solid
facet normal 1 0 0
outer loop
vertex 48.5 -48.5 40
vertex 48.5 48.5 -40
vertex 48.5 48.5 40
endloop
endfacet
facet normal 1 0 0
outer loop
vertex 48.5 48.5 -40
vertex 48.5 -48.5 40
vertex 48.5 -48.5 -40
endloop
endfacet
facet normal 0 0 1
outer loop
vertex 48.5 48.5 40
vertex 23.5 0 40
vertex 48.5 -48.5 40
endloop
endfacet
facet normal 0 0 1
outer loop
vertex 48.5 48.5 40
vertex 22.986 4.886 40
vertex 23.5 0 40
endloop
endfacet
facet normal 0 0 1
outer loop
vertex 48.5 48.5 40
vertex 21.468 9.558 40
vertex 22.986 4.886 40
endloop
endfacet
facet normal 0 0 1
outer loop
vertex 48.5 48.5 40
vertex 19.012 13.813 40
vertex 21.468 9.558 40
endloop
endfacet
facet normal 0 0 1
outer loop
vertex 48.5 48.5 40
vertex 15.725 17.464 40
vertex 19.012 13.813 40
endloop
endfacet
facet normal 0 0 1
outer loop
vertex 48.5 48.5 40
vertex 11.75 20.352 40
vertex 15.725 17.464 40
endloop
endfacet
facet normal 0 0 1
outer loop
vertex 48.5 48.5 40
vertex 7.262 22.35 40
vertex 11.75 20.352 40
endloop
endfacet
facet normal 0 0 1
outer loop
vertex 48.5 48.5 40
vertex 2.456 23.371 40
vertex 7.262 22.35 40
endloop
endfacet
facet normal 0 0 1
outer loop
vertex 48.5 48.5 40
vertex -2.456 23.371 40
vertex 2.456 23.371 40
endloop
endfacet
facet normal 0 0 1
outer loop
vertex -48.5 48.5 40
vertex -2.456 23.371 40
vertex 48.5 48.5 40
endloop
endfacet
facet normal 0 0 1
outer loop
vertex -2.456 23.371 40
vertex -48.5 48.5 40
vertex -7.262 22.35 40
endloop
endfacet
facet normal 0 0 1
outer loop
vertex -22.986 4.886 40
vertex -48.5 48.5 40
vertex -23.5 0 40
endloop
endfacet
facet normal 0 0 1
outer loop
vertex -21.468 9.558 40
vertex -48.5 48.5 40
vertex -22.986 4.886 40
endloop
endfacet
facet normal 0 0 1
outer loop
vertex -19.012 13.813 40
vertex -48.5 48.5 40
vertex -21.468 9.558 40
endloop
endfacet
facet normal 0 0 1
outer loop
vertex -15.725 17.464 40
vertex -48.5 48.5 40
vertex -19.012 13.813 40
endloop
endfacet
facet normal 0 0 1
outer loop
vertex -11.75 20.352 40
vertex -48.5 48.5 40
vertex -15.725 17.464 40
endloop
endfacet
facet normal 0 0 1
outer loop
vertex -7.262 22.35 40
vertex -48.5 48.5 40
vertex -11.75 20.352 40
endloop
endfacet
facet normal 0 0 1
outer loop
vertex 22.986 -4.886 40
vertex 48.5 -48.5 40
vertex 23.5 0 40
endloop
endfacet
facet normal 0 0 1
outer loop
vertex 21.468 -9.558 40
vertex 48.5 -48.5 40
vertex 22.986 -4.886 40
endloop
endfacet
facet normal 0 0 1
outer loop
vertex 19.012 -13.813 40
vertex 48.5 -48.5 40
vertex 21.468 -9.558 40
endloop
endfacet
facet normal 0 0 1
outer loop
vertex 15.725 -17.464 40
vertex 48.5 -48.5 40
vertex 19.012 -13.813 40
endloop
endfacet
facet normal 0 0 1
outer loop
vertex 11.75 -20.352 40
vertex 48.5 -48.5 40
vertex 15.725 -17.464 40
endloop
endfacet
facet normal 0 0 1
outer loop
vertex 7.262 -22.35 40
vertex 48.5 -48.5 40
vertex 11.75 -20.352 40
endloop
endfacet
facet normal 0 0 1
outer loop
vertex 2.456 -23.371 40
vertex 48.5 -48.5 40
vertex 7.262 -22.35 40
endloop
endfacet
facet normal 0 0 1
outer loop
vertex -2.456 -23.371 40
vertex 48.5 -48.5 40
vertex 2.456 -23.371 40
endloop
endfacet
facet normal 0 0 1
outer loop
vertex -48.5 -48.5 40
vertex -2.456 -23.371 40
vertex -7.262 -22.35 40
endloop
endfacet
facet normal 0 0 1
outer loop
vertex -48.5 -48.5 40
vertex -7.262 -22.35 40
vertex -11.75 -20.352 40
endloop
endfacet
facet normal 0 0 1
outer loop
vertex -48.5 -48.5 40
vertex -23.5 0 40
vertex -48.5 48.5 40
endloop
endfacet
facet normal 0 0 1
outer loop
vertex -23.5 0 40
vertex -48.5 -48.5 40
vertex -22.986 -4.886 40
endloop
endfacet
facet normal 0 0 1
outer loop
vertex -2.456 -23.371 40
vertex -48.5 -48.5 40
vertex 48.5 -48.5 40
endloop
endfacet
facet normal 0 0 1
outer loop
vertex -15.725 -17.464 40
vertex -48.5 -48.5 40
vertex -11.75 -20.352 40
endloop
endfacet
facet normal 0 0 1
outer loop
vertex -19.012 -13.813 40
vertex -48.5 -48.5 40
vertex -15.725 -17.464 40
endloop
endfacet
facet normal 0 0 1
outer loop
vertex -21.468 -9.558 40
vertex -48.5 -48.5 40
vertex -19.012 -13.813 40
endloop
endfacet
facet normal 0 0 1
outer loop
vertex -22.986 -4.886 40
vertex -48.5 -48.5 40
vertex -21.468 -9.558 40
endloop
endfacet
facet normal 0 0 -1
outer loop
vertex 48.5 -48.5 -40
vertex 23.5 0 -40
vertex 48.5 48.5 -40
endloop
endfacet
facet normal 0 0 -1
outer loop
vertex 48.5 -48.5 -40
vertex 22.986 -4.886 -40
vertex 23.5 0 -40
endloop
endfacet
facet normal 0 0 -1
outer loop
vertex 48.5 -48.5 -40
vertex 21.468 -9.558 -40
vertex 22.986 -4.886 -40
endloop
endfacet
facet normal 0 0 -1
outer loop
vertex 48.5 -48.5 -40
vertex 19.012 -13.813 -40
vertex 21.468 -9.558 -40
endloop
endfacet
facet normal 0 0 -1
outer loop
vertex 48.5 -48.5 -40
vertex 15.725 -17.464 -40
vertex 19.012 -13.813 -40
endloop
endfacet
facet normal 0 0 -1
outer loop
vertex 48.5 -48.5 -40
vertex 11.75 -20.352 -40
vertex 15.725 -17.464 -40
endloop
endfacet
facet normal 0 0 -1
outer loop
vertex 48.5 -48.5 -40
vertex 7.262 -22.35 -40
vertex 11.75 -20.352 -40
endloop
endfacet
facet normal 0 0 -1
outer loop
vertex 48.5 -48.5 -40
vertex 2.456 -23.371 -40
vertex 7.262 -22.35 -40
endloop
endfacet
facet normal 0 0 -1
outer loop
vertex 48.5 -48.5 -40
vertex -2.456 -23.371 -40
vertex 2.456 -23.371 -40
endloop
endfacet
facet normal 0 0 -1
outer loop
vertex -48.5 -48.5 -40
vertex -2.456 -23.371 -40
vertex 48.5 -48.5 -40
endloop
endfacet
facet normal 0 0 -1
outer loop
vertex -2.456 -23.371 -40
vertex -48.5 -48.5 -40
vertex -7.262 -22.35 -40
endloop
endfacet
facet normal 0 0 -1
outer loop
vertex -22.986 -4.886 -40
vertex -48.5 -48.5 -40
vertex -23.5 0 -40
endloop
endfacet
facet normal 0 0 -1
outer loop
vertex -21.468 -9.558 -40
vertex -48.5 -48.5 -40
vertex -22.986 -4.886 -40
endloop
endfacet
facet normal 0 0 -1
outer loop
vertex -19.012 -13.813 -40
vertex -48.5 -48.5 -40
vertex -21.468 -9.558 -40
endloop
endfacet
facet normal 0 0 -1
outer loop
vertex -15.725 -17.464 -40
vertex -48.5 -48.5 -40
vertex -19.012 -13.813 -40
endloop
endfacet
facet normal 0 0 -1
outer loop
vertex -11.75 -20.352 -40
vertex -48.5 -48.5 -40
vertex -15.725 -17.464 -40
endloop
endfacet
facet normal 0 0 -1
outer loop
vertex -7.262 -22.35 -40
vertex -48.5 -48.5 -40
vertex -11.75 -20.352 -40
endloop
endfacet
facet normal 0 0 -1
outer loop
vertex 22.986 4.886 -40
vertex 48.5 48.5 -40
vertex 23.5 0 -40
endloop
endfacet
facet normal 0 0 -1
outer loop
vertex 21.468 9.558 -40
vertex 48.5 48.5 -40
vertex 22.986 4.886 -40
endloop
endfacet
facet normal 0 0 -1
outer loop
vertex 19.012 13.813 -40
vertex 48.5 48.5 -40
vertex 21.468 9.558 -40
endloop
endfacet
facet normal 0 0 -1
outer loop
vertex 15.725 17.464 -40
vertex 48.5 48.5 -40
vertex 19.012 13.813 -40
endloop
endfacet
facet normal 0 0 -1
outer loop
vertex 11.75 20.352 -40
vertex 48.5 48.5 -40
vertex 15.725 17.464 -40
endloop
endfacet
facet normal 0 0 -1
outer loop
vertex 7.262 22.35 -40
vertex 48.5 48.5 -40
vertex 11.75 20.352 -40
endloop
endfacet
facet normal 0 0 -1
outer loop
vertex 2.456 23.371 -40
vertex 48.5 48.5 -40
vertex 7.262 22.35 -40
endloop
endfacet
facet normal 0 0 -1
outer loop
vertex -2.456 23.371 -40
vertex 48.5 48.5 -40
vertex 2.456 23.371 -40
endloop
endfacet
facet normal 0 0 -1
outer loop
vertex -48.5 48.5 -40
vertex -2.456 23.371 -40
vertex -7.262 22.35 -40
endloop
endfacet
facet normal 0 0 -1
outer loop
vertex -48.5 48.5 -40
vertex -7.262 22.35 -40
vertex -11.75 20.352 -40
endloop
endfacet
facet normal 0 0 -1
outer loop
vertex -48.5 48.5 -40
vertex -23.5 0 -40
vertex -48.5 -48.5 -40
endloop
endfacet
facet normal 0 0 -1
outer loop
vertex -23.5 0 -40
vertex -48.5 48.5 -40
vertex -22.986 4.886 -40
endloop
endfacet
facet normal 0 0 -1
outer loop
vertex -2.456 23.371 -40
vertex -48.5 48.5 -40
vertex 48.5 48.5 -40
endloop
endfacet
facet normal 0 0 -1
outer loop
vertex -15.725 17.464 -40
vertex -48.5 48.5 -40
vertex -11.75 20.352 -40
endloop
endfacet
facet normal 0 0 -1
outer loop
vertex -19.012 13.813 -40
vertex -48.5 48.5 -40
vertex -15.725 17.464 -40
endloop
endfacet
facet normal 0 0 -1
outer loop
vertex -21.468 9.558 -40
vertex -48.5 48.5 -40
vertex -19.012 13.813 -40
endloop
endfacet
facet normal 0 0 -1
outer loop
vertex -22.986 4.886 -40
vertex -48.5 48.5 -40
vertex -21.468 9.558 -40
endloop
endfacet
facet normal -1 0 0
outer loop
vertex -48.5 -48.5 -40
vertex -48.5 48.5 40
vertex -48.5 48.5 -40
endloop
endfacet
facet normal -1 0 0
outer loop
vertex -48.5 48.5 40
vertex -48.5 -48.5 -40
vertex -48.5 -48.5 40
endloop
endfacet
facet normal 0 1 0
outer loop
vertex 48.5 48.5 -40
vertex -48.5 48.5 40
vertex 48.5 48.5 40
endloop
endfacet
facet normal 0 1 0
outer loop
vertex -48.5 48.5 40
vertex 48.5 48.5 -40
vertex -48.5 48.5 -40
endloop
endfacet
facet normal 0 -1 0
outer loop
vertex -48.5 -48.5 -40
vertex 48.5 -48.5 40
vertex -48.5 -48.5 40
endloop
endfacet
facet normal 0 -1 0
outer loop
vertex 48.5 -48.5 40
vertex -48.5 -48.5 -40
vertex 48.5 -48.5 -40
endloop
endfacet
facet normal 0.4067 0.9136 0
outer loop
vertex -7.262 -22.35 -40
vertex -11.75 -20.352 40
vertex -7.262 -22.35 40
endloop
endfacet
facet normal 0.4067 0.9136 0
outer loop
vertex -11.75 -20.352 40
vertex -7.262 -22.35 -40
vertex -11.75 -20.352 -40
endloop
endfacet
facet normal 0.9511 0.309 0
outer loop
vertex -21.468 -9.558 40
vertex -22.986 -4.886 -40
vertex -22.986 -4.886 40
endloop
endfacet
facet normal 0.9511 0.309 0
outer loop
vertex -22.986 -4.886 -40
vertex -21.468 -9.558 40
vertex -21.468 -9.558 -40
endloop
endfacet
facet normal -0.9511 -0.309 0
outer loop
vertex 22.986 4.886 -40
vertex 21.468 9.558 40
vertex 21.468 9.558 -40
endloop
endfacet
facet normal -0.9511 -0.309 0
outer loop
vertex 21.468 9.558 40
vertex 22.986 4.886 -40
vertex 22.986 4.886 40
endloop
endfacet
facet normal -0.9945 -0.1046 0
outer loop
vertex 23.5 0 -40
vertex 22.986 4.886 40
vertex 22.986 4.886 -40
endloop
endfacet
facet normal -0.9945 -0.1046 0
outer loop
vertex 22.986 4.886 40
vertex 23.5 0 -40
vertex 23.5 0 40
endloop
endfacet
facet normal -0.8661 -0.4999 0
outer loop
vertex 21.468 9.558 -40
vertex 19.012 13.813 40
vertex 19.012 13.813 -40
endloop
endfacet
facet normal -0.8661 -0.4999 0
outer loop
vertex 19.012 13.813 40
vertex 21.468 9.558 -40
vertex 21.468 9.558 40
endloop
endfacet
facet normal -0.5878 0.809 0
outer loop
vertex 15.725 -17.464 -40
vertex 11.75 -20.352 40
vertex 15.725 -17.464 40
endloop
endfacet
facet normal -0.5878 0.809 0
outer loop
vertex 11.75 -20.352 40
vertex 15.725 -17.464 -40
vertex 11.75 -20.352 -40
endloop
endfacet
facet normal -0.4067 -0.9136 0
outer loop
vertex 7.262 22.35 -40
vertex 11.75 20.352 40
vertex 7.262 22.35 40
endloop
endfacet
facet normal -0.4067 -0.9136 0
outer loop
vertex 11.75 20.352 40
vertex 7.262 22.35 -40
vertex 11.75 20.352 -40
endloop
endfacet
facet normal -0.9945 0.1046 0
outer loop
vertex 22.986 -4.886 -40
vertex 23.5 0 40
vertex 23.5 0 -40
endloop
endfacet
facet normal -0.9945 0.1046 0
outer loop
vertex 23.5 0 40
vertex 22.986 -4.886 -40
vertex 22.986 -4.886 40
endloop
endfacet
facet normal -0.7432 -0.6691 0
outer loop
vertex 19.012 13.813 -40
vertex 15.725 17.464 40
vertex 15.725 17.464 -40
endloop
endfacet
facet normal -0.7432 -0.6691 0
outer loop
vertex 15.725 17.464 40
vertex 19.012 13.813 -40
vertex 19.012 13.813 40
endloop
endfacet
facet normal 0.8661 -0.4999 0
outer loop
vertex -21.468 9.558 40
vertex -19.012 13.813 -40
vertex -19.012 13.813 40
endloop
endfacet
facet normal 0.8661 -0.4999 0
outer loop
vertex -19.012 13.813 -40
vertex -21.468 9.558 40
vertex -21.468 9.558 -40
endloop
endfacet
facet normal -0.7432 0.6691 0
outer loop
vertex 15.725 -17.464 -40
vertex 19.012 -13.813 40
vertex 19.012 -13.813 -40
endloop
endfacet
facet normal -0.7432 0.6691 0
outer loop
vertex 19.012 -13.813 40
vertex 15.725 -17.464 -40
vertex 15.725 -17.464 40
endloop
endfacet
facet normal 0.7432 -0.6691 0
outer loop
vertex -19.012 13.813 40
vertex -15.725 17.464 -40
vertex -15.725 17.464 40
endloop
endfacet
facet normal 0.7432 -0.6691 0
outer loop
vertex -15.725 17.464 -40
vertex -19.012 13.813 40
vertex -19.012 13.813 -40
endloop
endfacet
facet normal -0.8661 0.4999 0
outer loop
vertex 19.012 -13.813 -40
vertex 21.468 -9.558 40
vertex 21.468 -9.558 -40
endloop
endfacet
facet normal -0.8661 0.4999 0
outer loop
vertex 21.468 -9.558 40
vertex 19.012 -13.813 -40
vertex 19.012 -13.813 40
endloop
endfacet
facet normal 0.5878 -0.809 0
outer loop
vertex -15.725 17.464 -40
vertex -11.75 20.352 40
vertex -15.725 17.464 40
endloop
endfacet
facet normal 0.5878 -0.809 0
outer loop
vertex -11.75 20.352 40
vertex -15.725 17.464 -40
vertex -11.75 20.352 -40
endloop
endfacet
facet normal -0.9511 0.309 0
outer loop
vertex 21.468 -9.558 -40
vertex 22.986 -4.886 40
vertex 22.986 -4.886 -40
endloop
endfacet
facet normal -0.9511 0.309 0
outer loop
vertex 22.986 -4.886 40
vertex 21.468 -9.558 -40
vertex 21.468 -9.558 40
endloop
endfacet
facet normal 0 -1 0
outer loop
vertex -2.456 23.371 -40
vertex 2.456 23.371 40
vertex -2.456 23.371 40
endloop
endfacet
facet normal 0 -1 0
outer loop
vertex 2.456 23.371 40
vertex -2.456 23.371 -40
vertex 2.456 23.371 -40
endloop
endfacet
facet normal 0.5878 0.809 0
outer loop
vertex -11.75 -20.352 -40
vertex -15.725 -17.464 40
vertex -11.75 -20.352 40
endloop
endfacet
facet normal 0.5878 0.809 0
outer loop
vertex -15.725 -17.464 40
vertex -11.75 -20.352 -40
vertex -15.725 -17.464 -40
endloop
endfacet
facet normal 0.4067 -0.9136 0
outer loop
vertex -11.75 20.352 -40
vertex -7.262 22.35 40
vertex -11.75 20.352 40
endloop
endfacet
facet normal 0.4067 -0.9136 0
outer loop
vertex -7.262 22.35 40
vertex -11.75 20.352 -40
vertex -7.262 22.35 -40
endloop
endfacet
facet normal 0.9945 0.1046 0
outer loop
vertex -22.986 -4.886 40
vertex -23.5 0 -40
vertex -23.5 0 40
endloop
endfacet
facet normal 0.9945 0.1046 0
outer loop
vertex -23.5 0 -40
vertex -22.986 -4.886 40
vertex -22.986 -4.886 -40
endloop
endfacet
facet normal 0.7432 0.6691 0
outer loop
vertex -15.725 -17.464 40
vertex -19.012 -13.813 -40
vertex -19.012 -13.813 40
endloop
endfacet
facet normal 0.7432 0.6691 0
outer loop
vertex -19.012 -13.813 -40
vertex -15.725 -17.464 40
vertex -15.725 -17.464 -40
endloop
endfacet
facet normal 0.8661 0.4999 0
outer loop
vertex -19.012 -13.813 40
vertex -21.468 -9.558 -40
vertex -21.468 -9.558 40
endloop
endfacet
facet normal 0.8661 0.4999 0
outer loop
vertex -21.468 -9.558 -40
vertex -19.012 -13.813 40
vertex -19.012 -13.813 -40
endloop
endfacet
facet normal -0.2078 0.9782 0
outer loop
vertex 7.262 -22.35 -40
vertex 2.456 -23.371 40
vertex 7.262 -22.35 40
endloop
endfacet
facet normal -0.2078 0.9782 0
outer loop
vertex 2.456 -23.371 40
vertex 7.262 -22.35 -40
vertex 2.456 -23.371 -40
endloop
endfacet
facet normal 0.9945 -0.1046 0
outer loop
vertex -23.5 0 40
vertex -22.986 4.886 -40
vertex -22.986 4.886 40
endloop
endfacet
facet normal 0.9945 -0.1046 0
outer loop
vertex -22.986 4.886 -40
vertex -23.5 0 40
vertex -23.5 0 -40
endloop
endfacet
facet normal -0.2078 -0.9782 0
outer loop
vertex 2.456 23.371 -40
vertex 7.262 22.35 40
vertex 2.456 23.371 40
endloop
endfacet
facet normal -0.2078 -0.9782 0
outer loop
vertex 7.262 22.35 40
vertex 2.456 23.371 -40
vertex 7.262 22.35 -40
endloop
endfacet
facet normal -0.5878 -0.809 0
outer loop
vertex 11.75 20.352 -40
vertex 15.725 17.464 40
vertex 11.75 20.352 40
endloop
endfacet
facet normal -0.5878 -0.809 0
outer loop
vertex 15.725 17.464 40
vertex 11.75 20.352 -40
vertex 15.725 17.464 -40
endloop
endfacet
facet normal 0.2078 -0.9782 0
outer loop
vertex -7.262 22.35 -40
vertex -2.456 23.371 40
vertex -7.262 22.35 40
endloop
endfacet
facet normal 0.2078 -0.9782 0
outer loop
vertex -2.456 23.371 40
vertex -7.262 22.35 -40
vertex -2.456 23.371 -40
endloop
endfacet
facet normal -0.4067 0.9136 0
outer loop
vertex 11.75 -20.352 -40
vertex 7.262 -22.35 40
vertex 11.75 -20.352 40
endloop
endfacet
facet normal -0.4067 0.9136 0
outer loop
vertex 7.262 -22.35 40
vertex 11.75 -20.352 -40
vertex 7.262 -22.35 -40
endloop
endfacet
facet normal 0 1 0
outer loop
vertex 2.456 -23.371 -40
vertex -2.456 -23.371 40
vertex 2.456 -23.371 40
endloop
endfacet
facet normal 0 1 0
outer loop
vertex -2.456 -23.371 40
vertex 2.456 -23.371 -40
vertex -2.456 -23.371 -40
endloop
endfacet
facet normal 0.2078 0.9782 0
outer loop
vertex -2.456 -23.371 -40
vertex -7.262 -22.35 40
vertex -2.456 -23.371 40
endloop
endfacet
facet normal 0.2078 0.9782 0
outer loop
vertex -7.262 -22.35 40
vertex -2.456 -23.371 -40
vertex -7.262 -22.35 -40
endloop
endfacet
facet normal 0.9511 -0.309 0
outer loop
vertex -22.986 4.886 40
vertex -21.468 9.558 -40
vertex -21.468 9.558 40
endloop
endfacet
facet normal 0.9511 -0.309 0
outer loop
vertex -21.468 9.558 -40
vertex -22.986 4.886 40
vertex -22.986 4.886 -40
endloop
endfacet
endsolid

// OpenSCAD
bearing_od = 47;
bearing_length = 15;

width = bearing_od + (2*25);
height = bearing_od + (2*25);
depth = 80;
// TODO ensure there is enough space for screw head
mounting_hole_spacing = 12;
mounting_hole_id = 5.25;
mounting_hole_qty = 7;


module mounting_holes() {
translate([-1*((mounting_hole_qty-1)*mounting_hole_spacing)/2,height,-1*height/2])
    for (i = [0 : mounting_hole_qty - 1])
        translate([i*mounting_hole_spacing,5])
            cylinder(h=height, d=mounting_hole_id);
}

module bearing_holder() {
   difference() {
       cube([width,height,depth], center=true);
       cylinder(h=height+2, d=bearing_od, center=true);
       mounting_holes();
   }
}

bearing_holder();
//mounting_holes();
